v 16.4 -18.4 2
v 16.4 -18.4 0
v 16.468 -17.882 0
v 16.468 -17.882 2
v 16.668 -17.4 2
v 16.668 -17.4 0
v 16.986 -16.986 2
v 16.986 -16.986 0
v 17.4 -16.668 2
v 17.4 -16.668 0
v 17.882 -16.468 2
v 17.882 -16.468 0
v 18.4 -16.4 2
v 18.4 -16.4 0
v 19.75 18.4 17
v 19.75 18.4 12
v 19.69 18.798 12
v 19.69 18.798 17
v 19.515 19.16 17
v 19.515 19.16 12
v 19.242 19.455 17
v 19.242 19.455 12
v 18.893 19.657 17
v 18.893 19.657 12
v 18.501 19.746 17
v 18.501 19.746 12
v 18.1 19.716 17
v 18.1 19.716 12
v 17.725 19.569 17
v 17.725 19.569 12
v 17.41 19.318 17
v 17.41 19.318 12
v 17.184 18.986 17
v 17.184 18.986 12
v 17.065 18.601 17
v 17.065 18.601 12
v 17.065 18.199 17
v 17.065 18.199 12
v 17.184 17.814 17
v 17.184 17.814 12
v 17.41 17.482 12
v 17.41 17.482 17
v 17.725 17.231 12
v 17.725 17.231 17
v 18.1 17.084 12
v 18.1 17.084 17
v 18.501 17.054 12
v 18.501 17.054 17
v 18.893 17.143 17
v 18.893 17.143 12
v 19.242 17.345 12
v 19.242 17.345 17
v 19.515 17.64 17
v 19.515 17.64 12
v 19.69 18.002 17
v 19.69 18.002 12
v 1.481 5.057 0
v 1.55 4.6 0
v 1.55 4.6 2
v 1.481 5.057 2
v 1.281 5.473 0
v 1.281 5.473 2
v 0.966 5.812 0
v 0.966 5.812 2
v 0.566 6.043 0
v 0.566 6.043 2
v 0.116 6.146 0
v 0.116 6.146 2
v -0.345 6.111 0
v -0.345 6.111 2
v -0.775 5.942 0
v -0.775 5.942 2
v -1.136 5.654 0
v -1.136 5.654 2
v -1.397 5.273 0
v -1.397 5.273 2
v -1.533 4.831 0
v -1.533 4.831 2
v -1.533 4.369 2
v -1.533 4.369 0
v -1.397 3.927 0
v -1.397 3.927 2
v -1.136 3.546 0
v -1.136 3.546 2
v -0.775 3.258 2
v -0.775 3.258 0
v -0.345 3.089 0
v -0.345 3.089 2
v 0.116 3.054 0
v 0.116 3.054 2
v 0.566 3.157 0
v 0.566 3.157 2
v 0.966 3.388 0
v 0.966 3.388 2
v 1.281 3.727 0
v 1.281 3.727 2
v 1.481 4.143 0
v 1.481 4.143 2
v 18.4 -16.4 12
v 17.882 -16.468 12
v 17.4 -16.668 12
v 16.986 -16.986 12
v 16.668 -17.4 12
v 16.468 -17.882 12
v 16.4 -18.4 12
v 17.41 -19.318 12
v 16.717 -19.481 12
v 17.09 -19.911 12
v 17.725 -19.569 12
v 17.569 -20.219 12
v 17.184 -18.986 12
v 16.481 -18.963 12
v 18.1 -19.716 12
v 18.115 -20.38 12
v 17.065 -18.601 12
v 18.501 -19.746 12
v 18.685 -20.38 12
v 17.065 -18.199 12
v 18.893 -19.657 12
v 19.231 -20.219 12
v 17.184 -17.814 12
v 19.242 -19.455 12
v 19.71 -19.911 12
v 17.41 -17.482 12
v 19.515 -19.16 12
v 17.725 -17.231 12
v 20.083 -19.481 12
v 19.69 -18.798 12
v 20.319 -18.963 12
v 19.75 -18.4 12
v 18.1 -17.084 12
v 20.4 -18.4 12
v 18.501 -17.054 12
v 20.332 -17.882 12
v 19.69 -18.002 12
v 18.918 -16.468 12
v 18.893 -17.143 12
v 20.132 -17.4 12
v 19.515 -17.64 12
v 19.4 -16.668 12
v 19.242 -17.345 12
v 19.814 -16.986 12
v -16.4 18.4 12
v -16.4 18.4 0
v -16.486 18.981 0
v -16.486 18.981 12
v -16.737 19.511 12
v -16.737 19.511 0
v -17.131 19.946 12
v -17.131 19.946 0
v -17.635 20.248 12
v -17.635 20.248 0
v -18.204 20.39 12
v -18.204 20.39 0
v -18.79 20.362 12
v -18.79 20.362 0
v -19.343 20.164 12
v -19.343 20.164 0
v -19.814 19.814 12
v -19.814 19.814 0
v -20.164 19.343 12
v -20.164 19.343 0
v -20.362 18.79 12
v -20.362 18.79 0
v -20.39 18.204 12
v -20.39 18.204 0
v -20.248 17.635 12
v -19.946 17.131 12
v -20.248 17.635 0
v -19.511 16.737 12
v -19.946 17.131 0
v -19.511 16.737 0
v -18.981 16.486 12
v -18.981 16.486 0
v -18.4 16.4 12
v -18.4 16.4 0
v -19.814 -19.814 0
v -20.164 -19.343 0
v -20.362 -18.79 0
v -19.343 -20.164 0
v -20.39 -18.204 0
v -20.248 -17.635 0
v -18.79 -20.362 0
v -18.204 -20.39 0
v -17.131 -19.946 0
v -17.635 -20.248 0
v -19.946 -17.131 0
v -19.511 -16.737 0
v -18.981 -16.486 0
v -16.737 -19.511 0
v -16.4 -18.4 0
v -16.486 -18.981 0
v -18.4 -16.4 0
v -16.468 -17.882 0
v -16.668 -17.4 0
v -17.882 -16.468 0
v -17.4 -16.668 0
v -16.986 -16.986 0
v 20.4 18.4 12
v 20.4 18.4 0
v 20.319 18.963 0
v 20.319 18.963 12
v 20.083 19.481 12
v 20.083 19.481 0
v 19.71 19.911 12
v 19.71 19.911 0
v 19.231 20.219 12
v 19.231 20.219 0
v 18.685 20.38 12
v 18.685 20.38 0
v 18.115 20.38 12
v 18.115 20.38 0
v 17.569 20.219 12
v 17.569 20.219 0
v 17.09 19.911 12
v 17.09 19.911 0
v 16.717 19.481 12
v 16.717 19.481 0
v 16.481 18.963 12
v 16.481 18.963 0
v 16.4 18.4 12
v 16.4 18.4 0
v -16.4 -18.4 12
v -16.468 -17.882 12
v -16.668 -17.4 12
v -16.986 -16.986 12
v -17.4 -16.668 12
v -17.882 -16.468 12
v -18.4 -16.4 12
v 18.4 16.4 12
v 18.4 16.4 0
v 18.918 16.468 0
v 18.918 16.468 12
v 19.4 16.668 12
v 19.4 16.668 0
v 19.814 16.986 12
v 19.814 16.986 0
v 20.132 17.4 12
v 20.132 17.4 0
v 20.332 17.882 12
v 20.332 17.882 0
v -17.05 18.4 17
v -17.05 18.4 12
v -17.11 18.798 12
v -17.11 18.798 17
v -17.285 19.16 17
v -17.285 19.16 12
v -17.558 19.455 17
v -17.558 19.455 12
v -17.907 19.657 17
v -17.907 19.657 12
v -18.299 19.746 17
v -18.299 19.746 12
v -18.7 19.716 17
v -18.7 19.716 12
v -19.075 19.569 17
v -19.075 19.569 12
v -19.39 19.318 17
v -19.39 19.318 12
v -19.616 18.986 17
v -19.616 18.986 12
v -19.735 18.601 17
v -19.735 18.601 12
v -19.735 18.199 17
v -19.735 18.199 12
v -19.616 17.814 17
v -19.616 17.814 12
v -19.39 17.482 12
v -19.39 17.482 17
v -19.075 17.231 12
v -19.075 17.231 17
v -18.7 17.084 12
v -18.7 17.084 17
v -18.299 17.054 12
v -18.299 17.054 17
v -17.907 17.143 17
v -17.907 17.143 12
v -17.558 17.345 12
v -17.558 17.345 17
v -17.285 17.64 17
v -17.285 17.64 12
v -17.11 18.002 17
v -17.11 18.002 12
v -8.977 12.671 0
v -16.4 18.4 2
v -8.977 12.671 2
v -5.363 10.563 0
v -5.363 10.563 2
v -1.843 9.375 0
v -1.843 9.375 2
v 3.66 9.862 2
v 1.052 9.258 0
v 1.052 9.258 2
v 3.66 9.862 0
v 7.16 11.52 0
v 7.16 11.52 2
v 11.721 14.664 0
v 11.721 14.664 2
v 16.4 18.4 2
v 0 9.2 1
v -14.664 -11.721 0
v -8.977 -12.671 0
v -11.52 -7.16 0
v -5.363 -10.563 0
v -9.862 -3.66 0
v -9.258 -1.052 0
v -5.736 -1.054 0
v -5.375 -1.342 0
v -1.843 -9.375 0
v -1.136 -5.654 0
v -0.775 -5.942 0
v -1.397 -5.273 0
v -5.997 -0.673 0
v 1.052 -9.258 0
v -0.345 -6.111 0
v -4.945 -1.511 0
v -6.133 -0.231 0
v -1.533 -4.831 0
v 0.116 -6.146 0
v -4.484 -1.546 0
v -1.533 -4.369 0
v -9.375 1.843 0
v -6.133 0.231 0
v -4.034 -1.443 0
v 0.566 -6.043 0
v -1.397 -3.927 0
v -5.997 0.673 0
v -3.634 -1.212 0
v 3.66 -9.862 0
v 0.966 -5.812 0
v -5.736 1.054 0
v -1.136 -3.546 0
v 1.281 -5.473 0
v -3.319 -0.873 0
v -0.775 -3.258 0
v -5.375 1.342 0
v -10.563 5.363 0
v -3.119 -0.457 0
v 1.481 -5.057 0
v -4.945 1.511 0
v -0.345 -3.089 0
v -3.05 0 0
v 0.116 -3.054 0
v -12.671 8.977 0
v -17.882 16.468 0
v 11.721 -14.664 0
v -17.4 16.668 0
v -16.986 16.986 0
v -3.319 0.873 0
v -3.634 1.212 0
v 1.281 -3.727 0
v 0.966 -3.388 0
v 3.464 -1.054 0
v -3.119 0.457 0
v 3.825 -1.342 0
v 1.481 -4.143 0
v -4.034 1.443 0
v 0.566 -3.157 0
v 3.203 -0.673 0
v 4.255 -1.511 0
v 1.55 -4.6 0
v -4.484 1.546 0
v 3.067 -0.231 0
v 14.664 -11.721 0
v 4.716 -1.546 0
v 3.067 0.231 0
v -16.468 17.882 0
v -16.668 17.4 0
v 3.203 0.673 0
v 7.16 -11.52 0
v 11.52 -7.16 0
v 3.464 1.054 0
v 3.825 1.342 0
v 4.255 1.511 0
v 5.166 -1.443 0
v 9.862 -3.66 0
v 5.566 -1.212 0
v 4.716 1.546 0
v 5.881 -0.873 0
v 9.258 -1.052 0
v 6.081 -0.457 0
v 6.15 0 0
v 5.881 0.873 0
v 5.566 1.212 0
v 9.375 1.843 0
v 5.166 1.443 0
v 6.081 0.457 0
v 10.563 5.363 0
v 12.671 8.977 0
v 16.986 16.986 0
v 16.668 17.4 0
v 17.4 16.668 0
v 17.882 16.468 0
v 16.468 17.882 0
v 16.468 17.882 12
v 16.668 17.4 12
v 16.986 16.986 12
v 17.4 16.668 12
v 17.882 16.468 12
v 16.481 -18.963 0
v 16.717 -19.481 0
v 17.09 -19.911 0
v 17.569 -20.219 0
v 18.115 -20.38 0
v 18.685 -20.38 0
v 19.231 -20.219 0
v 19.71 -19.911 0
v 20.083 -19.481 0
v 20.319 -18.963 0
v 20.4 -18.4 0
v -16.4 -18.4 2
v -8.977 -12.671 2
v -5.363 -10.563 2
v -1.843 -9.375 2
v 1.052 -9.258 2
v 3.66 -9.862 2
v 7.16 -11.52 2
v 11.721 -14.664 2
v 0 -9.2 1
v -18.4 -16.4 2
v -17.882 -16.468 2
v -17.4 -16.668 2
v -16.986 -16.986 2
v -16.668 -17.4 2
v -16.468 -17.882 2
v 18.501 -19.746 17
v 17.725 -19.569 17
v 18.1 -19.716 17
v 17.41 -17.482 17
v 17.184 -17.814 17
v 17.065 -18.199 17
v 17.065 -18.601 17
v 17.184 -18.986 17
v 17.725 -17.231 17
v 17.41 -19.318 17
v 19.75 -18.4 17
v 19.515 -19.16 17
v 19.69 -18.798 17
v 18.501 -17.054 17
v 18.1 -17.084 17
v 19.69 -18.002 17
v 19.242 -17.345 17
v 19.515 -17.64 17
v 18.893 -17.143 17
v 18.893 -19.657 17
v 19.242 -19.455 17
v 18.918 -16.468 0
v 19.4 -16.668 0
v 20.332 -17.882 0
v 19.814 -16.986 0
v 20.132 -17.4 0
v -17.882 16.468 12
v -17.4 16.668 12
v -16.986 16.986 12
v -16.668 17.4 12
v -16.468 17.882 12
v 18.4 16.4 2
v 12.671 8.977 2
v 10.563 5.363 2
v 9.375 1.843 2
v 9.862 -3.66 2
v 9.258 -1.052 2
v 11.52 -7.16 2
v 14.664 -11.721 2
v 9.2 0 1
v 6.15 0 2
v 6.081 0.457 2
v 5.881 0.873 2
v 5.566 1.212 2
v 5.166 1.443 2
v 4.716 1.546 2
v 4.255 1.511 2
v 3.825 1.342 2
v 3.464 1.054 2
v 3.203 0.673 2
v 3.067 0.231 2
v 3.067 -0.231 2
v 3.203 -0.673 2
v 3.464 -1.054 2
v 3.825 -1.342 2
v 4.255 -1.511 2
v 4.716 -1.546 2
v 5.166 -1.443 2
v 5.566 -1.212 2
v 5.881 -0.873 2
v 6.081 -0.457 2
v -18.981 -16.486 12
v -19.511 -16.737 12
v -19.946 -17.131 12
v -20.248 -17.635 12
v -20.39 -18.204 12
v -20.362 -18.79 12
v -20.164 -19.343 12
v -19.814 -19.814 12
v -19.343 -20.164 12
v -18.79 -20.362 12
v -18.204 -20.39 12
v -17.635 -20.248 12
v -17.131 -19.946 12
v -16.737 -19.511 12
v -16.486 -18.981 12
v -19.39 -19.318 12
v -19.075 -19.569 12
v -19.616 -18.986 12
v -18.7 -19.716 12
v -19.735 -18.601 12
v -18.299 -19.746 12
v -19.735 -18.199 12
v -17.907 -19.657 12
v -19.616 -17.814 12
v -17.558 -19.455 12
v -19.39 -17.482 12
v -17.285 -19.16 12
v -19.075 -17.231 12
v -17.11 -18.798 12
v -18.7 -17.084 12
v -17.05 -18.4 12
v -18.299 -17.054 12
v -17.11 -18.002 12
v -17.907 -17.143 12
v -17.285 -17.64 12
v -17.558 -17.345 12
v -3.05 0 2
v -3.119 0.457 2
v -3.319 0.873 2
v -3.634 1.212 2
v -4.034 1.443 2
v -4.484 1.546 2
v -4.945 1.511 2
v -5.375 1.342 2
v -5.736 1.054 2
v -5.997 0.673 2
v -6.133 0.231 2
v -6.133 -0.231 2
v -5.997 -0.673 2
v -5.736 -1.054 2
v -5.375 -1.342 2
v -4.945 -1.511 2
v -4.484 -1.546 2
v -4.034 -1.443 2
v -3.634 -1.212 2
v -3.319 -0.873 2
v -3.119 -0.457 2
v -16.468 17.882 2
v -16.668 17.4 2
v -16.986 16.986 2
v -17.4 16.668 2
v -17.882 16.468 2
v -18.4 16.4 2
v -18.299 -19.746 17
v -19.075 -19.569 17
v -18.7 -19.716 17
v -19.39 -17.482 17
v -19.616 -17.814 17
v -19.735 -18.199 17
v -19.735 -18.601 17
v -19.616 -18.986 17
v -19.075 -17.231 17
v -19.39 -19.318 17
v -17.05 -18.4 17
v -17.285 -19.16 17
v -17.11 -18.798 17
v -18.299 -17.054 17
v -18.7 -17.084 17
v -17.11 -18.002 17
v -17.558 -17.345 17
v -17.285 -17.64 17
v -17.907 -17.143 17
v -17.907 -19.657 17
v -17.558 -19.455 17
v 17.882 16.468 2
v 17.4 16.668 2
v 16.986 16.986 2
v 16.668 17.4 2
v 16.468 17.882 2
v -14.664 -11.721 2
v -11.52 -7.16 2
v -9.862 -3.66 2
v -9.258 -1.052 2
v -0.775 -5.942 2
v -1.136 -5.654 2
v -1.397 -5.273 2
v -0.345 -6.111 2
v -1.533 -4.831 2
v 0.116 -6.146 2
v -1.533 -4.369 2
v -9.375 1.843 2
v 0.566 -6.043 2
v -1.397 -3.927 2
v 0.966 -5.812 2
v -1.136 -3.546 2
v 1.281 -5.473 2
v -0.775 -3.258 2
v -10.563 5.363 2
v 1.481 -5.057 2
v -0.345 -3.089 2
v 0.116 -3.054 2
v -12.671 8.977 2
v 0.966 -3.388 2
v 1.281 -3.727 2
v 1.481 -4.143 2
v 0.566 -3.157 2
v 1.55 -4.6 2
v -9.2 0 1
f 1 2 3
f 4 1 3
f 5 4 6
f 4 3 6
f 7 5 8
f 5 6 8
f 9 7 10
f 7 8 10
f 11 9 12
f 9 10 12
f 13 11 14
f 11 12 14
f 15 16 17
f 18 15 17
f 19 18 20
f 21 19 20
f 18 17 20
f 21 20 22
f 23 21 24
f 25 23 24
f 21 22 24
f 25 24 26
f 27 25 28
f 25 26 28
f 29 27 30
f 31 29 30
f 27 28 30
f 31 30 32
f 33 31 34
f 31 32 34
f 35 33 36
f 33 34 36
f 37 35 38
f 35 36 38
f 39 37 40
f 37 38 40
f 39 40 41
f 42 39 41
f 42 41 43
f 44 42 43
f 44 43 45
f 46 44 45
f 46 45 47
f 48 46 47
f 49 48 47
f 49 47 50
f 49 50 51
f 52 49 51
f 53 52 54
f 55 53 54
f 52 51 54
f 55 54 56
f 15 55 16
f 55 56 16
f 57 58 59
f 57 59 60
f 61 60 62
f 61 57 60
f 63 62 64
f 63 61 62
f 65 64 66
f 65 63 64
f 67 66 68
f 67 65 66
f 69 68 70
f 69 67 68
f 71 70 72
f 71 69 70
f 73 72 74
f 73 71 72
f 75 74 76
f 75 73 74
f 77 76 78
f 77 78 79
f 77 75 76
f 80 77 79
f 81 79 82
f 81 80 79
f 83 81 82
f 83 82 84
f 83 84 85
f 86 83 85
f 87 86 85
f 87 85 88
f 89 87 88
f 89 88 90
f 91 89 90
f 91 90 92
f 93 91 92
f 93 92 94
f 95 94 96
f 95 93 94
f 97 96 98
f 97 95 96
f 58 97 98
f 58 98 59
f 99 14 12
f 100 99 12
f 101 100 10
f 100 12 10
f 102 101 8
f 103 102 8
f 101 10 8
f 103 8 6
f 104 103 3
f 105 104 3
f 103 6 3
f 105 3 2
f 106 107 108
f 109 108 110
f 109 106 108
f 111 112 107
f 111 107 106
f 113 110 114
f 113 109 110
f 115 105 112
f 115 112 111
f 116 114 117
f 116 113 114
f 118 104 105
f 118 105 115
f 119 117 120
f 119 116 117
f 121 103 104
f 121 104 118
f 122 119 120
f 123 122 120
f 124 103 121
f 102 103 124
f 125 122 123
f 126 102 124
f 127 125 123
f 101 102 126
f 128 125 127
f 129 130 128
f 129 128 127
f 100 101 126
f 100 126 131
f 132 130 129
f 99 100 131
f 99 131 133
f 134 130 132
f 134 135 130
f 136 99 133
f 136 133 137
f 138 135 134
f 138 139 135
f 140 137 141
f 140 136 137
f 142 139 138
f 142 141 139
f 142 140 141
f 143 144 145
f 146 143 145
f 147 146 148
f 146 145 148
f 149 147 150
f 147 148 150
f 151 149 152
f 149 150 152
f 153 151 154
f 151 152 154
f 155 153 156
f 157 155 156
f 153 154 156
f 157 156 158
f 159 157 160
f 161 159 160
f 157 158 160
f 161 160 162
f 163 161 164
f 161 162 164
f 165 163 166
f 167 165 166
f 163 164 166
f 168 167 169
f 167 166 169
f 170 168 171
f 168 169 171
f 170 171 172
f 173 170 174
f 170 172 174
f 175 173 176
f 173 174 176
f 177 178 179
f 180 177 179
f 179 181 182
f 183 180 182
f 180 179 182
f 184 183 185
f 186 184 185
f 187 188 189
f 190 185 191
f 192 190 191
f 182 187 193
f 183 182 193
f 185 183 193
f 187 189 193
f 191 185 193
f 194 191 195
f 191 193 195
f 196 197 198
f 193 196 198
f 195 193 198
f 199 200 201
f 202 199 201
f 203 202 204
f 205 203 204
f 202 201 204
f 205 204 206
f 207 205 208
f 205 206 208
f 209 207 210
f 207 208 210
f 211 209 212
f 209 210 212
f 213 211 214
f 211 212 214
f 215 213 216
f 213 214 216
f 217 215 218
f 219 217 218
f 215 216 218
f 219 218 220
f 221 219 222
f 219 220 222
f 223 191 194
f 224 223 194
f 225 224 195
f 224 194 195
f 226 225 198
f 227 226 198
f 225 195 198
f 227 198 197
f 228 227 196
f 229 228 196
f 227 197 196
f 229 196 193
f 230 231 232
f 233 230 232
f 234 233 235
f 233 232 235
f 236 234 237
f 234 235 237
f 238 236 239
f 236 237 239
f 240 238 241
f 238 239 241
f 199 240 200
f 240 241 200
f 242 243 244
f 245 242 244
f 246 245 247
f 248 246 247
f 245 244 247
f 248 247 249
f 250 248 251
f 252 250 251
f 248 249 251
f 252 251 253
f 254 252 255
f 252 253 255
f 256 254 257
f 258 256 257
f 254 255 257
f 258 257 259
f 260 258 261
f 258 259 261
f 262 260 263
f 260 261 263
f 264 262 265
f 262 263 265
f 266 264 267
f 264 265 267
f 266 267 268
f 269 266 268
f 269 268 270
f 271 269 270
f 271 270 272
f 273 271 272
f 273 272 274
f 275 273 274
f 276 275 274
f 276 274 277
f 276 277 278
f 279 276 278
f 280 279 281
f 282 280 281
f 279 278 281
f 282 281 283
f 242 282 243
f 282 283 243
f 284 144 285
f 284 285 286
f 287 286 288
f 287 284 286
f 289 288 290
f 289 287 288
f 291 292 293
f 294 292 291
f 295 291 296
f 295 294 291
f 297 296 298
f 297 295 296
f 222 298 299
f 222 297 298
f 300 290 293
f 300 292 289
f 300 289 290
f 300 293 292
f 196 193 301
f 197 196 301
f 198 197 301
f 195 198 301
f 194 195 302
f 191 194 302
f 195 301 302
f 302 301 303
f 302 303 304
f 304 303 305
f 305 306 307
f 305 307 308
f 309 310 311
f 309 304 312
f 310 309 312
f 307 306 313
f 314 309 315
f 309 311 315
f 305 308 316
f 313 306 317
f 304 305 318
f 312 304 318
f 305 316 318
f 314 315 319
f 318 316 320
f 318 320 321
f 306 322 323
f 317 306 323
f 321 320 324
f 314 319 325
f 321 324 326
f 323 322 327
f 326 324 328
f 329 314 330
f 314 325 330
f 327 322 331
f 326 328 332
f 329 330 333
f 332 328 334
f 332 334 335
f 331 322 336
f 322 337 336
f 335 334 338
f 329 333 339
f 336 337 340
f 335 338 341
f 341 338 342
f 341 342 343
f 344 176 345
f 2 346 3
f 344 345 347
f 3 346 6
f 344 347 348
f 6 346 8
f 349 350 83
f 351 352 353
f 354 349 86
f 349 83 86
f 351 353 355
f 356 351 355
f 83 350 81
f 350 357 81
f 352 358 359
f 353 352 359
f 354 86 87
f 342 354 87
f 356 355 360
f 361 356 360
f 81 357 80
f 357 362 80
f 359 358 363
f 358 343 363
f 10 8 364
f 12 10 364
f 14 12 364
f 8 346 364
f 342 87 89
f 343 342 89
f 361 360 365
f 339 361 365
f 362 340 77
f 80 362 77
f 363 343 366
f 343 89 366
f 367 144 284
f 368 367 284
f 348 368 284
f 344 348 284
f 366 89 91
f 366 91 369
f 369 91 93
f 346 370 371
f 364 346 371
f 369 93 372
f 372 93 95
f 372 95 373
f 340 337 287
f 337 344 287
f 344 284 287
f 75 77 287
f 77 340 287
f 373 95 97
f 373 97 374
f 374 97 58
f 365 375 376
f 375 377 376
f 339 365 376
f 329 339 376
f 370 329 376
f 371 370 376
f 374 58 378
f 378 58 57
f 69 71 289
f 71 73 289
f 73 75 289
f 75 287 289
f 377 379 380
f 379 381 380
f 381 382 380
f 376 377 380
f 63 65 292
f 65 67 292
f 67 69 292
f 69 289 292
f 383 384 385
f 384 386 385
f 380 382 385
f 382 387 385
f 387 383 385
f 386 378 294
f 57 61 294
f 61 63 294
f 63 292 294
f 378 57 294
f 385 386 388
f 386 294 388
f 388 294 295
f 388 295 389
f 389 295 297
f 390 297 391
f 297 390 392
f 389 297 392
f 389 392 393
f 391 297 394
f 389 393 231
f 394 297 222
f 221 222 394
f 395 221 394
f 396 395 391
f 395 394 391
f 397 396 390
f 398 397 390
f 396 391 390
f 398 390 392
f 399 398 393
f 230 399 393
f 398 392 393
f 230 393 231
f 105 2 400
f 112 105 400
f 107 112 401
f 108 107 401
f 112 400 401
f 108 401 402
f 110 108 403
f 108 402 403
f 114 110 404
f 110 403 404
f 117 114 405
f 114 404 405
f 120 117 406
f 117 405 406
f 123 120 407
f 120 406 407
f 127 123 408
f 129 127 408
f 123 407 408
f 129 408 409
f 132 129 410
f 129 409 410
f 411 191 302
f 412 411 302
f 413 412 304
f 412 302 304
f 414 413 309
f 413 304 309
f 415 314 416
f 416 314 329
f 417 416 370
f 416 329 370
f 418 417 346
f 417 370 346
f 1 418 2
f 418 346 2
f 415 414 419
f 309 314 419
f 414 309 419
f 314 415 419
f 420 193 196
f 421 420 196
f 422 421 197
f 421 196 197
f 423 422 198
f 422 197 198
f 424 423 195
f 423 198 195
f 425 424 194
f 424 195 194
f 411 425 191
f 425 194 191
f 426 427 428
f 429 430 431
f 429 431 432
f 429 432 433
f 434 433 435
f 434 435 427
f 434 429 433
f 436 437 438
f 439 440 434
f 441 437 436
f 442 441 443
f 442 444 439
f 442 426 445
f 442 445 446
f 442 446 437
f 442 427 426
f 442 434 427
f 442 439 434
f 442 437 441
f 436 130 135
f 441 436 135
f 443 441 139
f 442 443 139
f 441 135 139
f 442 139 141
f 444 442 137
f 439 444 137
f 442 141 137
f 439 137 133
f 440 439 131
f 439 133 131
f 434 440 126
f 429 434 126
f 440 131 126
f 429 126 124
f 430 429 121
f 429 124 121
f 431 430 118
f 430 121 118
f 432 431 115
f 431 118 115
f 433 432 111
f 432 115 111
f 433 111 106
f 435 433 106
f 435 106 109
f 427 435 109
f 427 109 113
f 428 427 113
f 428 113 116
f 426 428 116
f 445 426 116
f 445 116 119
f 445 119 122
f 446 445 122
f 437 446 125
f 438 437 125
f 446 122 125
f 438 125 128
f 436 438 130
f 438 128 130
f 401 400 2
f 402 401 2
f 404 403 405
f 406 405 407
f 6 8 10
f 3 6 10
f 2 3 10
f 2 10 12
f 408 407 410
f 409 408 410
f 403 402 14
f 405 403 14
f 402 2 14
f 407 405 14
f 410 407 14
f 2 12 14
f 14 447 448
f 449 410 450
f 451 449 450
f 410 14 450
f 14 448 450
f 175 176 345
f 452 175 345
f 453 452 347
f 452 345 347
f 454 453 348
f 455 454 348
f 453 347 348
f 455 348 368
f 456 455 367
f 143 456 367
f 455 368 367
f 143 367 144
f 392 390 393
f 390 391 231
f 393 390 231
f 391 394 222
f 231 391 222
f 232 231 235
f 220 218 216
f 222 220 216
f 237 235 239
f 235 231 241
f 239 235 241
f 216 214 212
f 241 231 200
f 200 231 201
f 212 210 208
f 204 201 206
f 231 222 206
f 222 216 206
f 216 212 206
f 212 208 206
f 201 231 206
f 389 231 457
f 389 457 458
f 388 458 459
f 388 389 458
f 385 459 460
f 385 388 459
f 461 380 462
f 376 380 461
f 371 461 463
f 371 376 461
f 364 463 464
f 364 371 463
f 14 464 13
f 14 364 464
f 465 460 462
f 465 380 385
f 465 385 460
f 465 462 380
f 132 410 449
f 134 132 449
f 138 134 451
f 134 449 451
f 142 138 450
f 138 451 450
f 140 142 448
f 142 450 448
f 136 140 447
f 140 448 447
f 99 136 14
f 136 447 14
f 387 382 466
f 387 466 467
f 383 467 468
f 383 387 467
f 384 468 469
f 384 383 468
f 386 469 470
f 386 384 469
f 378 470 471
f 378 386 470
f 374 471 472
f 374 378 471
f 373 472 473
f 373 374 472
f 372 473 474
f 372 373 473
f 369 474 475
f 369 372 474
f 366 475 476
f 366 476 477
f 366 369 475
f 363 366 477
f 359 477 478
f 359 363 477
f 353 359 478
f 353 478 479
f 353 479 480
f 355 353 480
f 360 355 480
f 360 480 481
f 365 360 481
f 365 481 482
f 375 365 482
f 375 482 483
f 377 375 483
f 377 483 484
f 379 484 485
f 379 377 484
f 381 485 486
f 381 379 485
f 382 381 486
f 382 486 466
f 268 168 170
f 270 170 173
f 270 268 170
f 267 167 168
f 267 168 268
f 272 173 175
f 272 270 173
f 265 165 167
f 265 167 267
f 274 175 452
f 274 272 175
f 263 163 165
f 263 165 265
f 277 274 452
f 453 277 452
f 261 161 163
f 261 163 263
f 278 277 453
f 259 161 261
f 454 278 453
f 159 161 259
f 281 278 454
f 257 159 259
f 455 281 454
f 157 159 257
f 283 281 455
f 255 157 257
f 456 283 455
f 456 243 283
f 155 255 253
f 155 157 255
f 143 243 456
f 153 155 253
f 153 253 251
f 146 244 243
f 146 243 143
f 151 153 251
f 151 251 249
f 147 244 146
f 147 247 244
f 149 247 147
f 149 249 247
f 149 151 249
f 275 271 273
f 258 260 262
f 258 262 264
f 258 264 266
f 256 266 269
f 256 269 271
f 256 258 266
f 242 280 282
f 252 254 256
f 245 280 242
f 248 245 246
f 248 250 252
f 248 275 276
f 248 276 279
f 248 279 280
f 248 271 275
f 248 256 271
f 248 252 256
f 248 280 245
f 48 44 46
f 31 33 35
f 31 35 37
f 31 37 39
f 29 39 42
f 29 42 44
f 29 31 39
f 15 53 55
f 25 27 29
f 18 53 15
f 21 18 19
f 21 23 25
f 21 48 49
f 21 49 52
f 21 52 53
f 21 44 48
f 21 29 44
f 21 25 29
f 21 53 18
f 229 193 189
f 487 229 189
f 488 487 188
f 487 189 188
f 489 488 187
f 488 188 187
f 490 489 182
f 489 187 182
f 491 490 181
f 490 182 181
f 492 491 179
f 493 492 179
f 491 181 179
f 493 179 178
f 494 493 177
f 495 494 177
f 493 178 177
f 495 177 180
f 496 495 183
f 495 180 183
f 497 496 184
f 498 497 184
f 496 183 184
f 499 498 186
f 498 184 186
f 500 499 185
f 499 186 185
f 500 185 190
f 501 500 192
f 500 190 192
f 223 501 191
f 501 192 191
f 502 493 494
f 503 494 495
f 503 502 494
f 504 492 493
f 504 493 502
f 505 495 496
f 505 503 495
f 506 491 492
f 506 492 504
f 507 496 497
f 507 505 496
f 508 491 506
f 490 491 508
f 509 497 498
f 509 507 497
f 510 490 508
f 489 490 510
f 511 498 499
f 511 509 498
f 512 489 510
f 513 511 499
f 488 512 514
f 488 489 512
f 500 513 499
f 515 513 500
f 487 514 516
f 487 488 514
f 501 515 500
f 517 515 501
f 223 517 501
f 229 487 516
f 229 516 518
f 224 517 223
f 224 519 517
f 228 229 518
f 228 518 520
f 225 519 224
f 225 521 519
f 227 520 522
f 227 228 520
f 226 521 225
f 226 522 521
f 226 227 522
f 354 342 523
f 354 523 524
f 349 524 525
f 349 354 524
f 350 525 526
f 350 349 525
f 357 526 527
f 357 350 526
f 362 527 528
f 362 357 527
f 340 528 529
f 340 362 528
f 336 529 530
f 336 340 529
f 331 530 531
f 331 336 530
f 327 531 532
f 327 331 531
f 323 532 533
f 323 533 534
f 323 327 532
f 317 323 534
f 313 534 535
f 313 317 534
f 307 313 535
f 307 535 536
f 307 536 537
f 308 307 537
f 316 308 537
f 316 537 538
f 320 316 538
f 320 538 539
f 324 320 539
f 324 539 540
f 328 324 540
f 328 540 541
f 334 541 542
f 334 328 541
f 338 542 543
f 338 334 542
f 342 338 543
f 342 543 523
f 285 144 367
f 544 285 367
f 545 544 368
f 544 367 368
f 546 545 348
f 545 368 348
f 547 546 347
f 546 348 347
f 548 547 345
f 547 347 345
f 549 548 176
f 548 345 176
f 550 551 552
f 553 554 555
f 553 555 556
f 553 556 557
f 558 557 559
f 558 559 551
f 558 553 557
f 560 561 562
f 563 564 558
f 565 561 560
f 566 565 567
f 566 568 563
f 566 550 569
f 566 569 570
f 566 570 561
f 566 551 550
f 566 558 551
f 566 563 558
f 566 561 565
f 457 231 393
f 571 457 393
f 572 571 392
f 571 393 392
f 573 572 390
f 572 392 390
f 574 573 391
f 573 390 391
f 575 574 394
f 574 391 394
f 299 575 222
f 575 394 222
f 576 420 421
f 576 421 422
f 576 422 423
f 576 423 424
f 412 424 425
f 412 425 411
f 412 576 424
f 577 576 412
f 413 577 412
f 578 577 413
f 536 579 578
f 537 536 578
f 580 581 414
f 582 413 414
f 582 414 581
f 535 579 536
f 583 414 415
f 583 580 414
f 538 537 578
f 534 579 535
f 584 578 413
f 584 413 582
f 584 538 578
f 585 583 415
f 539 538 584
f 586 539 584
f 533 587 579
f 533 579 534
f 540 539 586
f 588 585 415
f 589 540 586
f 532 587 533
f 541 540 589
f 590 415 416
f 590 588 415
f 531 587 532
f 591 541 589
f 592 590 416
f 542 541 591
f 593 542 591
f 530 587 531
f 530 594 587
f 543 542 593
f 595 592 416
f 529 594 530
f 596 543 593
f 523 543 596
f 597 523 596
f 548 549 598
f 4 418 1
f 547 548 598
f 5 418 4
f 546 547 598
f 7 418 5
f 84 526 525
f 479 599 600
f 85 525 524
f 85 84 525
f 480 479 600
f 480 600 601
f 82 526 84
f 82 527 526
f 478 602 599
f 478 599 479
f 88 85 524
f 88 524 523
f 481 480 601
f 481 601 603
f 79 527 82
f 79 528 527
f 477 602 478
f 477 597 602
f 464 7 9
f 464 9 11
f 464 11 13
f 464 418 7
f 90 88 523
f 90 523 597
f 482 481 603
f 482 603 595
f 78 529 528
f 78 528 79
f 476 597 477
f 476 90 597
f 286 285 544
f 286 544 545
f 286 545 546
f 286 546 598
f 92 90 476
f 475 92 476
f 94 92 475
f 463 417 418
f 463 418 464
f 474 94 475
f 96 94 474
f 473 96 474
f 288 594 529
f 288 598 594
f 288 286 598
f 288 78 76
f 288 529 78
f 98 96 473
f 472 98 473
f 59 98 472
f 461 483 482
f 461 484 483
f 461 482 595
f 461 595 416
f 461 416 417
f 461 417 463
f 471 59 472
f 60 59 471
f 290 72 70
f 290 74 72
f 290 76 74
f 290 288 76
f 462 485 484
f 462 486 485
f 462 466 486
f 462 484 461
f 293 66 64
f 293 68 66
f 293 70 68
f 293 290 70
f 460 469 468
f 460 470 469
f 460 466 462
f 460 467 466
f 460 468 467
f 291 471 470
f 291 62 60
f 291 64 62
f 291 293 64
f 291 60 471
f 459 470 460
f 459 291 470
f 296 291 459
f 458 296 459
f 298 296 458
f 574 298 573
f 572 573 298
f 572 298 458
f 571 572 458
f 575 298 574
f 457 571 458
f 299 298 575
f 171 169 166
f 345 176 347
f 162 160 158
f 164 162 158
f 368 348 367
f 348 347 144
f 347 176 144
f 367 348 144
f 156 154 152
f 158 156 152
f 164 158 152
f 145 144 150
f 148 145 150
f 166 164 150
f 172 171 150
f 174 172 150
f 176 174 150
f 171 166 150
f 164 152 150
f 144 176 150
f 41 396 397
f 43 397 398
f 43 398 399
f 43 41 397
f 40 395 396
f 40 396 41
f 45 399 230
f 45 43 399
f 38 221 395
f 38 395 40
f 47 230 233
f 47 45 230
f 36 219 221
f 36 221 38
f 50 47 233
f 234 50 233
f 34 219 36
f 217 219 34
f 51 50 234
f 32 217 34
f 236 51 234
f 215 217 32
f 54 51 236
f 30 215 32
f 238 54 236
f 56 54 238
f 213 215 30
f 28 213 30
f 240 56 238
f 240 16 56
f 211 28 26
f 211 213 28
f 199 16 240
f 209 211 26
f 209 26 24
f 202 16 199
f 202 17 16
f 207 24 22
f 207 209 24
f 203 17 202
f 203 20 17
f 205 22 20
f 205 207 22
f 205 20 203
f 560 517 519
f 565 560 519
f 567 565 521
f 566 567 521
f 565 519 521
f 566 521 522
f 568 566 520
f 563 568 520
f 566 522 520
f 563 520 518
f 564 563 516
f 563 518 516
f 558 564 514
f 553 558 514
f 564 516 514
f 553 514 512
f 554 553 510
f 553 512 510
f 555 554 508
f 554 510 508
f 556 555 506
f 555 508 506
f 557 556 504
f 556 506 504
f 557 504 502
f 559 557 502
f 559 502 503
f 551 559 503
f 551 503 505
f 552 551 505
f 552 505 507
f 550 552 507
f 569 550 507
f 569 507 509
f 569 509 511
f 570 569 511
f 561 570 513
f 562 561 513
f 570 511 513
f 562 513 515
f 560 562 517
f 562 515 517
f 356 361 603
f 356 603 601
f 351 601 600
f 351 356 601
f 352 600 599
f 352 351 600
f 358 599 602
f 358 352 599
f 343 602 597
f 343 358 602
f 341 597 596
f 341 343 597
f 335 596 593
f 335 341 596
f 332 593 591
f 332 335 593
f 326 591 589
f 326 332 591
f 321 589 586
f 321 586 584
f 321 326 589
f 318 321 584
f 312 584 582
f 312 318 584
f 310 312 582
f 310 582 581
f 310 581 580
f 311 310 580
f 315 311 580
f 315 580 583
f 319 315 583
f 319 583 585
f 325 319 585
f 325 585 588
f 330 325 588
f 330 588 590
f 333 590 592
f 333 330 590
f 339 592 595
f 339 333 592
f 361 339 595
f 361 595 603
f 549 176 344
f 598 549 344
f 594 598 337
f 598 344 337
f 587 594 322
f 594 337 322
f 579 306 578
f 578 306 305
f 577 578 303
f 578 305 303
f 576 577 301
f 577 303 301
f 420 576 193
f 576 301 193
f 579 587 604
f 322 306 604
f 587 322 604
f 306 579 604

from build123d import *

# Parameters (mm, degrees)
F1_DEPTH  = 12
F0_R      = 1.55
F2_DEPTH  = 2
F3_R      = 1.35
F4_DEPTH  = 5
F5_R      = 1.35
F6_DEPTH  = 5
F7_R      = 1.35
F8_DEPTH  = 5
F9_R      = 1.35
F10_DEPTH = 5


with BuildPart() as f1:
    # F0 (on Top) → F1 (new body)
    with BuildSketch(Plane.XY):
        with BuildLine():
            ThreePointArc((18.4, 16.4), (19.814214, 16.985786), (20.4, 18.4))
            ThreePointArc((20.4, 18.4), (18.4, 20.4), (16.4, 18.4))
            ThreePointArc((16.4, 18.4), (16.985786, 16.985786), (18.4, 16.4))
        make_face()
        with BuildLine():
            ThreePointArc((-16.4, -18.4), (-16.985786, -16.985786), (-18.4, -16.4))
            ThreePointArc((-18.4, -16.4), (-19.814214, -19.814214), (-16.4, -18.4))
        make_face()
        with BuildLine():
            ThreePointArc((20.4, -18.4), (19.814214, -16.985786), (18.4, -16.4))
            ThreePointArc((18.4, -16.4), (16.985786, -16.985786), (16.4, -18.4))
            ThreePointArc((16.4, -18.4), (18.4, -20.4), (20.4, -18.4))
        make_face()
        with BuildLine():
            ThreePointArc((-18.4, 16.4), (-16.985786, 16.985786), (-16.4, 18.4))
            ThreePointArc((-16.4, 18.4), (-19.814214, 19.814214), (-18.4, 16.4))
        make_face()
    extrude(amount=F1_DEPTH)

    # F3 (on face) → F4 (join)
    with BuildSketch(Plane.XY.offset(12)):
        with Locations((18.4, 18.4)):
            Circle(F3_R)
    extrude(amount=F4_DEPTH)

    # F5 (on face) → F6 (join)
    with BuildSketch(Plane.XY.offset(12)):
        with Locations((18.4, -18.4)):
            Circle(F5_R)
    extrude(amount=F6_DEPTH)

    # F7 (on face) → F8 (join)
    with BuildSketch(Plane.XY.offset(12)):
        with Locations((-18.4, -18.4)):
            Circle(F7_R)
    extrude(amount=F8_DEPTH)

    # F9 (on face) → F10 (join)
    with BuildSketch(Plane.XY.offset(12)):
        with Locations((-18.4, 18.4)):
            Circle(F9_R)
    extrude(amount=F10_DEPTH)


with BuildPart() as f2:
    # F0 (on Top) → F2 (new body)
    with BuildSketch(Plane.XY):
        with BuildLine():
            ThreePointArc((18.4, 16.4), (16.985786, 16.985786), (16.4, 18.4))
            add(Edge.make_bspline(
                [(-16.4, 18.4), (-10.7, 13.8), (0, 4.6), (10.7, 13.8), (16.4, 18.4)],
                knots=[0, 0, 0, 0, 18.804255, 37.60851, 37.60851, 37.60851, 37.60851], degree=3))
            ThreePointArc((-16.4, 18.4), (-16.985786, 16.985786), (-18.4, 16.4))
            add(Edge.make_bspline(
                [(-18.4, 16.4), (-13.8, 10.7), (-4.6, 0), (-13.8, -10.7), (-18.4, -16.4)],
                knots=[0, 0, 0, 0, 18.804255, 37.60851, 37.60851, 37.60851, 37.60851], degree=3))
            ThreePointArc((-18.4, -16.4), (-16.985786, -16.985786), (-16.4, -18.4))
            add(Edge.make_bspline(
                [(-16.4, -18.4), (-10.7, -13.8), (0, -4.6), (10.7, -13.8), (16.4, -18.4)],
                knots=[0, 0, 0, 0, 18.804255, 37.60851, 37.60851, 37.60851, 37.60851], degree=3))
            ThreePointArc((16.4, -18.4), (16.985786, -16.985786), (18.4, -16.4))
            add(Edge.make_bspline(
                [(18.4, 16.4), (13.8, 10.7), (4.6, 0), (13.8, -10.7), (18.4, -16.4)],
                knots=[0, 0, 0, 0, 18.804255, 37.60851, 37.60851, 37.60851, 37.60851], degree=3))
        make_face()
        with Locations((0, -4.6)):
            Circle(F0_R, mode=Mode.SUBTRACT)
        with Locations((-4.6, 0)):
            Circle(F0_R, mode=Mode.SUBTRACT)
        with Locations((4.6, 0)):
            Circle(F0_R, mode=Mode.SUBTRACT)
        with Locations((0, 4.6)):
            Circle(F0_R, mode=Mode.SUBTRACT)
    extrude(amount=F2_DEPTH)


solid = Compound([f1.part, f2.part])
